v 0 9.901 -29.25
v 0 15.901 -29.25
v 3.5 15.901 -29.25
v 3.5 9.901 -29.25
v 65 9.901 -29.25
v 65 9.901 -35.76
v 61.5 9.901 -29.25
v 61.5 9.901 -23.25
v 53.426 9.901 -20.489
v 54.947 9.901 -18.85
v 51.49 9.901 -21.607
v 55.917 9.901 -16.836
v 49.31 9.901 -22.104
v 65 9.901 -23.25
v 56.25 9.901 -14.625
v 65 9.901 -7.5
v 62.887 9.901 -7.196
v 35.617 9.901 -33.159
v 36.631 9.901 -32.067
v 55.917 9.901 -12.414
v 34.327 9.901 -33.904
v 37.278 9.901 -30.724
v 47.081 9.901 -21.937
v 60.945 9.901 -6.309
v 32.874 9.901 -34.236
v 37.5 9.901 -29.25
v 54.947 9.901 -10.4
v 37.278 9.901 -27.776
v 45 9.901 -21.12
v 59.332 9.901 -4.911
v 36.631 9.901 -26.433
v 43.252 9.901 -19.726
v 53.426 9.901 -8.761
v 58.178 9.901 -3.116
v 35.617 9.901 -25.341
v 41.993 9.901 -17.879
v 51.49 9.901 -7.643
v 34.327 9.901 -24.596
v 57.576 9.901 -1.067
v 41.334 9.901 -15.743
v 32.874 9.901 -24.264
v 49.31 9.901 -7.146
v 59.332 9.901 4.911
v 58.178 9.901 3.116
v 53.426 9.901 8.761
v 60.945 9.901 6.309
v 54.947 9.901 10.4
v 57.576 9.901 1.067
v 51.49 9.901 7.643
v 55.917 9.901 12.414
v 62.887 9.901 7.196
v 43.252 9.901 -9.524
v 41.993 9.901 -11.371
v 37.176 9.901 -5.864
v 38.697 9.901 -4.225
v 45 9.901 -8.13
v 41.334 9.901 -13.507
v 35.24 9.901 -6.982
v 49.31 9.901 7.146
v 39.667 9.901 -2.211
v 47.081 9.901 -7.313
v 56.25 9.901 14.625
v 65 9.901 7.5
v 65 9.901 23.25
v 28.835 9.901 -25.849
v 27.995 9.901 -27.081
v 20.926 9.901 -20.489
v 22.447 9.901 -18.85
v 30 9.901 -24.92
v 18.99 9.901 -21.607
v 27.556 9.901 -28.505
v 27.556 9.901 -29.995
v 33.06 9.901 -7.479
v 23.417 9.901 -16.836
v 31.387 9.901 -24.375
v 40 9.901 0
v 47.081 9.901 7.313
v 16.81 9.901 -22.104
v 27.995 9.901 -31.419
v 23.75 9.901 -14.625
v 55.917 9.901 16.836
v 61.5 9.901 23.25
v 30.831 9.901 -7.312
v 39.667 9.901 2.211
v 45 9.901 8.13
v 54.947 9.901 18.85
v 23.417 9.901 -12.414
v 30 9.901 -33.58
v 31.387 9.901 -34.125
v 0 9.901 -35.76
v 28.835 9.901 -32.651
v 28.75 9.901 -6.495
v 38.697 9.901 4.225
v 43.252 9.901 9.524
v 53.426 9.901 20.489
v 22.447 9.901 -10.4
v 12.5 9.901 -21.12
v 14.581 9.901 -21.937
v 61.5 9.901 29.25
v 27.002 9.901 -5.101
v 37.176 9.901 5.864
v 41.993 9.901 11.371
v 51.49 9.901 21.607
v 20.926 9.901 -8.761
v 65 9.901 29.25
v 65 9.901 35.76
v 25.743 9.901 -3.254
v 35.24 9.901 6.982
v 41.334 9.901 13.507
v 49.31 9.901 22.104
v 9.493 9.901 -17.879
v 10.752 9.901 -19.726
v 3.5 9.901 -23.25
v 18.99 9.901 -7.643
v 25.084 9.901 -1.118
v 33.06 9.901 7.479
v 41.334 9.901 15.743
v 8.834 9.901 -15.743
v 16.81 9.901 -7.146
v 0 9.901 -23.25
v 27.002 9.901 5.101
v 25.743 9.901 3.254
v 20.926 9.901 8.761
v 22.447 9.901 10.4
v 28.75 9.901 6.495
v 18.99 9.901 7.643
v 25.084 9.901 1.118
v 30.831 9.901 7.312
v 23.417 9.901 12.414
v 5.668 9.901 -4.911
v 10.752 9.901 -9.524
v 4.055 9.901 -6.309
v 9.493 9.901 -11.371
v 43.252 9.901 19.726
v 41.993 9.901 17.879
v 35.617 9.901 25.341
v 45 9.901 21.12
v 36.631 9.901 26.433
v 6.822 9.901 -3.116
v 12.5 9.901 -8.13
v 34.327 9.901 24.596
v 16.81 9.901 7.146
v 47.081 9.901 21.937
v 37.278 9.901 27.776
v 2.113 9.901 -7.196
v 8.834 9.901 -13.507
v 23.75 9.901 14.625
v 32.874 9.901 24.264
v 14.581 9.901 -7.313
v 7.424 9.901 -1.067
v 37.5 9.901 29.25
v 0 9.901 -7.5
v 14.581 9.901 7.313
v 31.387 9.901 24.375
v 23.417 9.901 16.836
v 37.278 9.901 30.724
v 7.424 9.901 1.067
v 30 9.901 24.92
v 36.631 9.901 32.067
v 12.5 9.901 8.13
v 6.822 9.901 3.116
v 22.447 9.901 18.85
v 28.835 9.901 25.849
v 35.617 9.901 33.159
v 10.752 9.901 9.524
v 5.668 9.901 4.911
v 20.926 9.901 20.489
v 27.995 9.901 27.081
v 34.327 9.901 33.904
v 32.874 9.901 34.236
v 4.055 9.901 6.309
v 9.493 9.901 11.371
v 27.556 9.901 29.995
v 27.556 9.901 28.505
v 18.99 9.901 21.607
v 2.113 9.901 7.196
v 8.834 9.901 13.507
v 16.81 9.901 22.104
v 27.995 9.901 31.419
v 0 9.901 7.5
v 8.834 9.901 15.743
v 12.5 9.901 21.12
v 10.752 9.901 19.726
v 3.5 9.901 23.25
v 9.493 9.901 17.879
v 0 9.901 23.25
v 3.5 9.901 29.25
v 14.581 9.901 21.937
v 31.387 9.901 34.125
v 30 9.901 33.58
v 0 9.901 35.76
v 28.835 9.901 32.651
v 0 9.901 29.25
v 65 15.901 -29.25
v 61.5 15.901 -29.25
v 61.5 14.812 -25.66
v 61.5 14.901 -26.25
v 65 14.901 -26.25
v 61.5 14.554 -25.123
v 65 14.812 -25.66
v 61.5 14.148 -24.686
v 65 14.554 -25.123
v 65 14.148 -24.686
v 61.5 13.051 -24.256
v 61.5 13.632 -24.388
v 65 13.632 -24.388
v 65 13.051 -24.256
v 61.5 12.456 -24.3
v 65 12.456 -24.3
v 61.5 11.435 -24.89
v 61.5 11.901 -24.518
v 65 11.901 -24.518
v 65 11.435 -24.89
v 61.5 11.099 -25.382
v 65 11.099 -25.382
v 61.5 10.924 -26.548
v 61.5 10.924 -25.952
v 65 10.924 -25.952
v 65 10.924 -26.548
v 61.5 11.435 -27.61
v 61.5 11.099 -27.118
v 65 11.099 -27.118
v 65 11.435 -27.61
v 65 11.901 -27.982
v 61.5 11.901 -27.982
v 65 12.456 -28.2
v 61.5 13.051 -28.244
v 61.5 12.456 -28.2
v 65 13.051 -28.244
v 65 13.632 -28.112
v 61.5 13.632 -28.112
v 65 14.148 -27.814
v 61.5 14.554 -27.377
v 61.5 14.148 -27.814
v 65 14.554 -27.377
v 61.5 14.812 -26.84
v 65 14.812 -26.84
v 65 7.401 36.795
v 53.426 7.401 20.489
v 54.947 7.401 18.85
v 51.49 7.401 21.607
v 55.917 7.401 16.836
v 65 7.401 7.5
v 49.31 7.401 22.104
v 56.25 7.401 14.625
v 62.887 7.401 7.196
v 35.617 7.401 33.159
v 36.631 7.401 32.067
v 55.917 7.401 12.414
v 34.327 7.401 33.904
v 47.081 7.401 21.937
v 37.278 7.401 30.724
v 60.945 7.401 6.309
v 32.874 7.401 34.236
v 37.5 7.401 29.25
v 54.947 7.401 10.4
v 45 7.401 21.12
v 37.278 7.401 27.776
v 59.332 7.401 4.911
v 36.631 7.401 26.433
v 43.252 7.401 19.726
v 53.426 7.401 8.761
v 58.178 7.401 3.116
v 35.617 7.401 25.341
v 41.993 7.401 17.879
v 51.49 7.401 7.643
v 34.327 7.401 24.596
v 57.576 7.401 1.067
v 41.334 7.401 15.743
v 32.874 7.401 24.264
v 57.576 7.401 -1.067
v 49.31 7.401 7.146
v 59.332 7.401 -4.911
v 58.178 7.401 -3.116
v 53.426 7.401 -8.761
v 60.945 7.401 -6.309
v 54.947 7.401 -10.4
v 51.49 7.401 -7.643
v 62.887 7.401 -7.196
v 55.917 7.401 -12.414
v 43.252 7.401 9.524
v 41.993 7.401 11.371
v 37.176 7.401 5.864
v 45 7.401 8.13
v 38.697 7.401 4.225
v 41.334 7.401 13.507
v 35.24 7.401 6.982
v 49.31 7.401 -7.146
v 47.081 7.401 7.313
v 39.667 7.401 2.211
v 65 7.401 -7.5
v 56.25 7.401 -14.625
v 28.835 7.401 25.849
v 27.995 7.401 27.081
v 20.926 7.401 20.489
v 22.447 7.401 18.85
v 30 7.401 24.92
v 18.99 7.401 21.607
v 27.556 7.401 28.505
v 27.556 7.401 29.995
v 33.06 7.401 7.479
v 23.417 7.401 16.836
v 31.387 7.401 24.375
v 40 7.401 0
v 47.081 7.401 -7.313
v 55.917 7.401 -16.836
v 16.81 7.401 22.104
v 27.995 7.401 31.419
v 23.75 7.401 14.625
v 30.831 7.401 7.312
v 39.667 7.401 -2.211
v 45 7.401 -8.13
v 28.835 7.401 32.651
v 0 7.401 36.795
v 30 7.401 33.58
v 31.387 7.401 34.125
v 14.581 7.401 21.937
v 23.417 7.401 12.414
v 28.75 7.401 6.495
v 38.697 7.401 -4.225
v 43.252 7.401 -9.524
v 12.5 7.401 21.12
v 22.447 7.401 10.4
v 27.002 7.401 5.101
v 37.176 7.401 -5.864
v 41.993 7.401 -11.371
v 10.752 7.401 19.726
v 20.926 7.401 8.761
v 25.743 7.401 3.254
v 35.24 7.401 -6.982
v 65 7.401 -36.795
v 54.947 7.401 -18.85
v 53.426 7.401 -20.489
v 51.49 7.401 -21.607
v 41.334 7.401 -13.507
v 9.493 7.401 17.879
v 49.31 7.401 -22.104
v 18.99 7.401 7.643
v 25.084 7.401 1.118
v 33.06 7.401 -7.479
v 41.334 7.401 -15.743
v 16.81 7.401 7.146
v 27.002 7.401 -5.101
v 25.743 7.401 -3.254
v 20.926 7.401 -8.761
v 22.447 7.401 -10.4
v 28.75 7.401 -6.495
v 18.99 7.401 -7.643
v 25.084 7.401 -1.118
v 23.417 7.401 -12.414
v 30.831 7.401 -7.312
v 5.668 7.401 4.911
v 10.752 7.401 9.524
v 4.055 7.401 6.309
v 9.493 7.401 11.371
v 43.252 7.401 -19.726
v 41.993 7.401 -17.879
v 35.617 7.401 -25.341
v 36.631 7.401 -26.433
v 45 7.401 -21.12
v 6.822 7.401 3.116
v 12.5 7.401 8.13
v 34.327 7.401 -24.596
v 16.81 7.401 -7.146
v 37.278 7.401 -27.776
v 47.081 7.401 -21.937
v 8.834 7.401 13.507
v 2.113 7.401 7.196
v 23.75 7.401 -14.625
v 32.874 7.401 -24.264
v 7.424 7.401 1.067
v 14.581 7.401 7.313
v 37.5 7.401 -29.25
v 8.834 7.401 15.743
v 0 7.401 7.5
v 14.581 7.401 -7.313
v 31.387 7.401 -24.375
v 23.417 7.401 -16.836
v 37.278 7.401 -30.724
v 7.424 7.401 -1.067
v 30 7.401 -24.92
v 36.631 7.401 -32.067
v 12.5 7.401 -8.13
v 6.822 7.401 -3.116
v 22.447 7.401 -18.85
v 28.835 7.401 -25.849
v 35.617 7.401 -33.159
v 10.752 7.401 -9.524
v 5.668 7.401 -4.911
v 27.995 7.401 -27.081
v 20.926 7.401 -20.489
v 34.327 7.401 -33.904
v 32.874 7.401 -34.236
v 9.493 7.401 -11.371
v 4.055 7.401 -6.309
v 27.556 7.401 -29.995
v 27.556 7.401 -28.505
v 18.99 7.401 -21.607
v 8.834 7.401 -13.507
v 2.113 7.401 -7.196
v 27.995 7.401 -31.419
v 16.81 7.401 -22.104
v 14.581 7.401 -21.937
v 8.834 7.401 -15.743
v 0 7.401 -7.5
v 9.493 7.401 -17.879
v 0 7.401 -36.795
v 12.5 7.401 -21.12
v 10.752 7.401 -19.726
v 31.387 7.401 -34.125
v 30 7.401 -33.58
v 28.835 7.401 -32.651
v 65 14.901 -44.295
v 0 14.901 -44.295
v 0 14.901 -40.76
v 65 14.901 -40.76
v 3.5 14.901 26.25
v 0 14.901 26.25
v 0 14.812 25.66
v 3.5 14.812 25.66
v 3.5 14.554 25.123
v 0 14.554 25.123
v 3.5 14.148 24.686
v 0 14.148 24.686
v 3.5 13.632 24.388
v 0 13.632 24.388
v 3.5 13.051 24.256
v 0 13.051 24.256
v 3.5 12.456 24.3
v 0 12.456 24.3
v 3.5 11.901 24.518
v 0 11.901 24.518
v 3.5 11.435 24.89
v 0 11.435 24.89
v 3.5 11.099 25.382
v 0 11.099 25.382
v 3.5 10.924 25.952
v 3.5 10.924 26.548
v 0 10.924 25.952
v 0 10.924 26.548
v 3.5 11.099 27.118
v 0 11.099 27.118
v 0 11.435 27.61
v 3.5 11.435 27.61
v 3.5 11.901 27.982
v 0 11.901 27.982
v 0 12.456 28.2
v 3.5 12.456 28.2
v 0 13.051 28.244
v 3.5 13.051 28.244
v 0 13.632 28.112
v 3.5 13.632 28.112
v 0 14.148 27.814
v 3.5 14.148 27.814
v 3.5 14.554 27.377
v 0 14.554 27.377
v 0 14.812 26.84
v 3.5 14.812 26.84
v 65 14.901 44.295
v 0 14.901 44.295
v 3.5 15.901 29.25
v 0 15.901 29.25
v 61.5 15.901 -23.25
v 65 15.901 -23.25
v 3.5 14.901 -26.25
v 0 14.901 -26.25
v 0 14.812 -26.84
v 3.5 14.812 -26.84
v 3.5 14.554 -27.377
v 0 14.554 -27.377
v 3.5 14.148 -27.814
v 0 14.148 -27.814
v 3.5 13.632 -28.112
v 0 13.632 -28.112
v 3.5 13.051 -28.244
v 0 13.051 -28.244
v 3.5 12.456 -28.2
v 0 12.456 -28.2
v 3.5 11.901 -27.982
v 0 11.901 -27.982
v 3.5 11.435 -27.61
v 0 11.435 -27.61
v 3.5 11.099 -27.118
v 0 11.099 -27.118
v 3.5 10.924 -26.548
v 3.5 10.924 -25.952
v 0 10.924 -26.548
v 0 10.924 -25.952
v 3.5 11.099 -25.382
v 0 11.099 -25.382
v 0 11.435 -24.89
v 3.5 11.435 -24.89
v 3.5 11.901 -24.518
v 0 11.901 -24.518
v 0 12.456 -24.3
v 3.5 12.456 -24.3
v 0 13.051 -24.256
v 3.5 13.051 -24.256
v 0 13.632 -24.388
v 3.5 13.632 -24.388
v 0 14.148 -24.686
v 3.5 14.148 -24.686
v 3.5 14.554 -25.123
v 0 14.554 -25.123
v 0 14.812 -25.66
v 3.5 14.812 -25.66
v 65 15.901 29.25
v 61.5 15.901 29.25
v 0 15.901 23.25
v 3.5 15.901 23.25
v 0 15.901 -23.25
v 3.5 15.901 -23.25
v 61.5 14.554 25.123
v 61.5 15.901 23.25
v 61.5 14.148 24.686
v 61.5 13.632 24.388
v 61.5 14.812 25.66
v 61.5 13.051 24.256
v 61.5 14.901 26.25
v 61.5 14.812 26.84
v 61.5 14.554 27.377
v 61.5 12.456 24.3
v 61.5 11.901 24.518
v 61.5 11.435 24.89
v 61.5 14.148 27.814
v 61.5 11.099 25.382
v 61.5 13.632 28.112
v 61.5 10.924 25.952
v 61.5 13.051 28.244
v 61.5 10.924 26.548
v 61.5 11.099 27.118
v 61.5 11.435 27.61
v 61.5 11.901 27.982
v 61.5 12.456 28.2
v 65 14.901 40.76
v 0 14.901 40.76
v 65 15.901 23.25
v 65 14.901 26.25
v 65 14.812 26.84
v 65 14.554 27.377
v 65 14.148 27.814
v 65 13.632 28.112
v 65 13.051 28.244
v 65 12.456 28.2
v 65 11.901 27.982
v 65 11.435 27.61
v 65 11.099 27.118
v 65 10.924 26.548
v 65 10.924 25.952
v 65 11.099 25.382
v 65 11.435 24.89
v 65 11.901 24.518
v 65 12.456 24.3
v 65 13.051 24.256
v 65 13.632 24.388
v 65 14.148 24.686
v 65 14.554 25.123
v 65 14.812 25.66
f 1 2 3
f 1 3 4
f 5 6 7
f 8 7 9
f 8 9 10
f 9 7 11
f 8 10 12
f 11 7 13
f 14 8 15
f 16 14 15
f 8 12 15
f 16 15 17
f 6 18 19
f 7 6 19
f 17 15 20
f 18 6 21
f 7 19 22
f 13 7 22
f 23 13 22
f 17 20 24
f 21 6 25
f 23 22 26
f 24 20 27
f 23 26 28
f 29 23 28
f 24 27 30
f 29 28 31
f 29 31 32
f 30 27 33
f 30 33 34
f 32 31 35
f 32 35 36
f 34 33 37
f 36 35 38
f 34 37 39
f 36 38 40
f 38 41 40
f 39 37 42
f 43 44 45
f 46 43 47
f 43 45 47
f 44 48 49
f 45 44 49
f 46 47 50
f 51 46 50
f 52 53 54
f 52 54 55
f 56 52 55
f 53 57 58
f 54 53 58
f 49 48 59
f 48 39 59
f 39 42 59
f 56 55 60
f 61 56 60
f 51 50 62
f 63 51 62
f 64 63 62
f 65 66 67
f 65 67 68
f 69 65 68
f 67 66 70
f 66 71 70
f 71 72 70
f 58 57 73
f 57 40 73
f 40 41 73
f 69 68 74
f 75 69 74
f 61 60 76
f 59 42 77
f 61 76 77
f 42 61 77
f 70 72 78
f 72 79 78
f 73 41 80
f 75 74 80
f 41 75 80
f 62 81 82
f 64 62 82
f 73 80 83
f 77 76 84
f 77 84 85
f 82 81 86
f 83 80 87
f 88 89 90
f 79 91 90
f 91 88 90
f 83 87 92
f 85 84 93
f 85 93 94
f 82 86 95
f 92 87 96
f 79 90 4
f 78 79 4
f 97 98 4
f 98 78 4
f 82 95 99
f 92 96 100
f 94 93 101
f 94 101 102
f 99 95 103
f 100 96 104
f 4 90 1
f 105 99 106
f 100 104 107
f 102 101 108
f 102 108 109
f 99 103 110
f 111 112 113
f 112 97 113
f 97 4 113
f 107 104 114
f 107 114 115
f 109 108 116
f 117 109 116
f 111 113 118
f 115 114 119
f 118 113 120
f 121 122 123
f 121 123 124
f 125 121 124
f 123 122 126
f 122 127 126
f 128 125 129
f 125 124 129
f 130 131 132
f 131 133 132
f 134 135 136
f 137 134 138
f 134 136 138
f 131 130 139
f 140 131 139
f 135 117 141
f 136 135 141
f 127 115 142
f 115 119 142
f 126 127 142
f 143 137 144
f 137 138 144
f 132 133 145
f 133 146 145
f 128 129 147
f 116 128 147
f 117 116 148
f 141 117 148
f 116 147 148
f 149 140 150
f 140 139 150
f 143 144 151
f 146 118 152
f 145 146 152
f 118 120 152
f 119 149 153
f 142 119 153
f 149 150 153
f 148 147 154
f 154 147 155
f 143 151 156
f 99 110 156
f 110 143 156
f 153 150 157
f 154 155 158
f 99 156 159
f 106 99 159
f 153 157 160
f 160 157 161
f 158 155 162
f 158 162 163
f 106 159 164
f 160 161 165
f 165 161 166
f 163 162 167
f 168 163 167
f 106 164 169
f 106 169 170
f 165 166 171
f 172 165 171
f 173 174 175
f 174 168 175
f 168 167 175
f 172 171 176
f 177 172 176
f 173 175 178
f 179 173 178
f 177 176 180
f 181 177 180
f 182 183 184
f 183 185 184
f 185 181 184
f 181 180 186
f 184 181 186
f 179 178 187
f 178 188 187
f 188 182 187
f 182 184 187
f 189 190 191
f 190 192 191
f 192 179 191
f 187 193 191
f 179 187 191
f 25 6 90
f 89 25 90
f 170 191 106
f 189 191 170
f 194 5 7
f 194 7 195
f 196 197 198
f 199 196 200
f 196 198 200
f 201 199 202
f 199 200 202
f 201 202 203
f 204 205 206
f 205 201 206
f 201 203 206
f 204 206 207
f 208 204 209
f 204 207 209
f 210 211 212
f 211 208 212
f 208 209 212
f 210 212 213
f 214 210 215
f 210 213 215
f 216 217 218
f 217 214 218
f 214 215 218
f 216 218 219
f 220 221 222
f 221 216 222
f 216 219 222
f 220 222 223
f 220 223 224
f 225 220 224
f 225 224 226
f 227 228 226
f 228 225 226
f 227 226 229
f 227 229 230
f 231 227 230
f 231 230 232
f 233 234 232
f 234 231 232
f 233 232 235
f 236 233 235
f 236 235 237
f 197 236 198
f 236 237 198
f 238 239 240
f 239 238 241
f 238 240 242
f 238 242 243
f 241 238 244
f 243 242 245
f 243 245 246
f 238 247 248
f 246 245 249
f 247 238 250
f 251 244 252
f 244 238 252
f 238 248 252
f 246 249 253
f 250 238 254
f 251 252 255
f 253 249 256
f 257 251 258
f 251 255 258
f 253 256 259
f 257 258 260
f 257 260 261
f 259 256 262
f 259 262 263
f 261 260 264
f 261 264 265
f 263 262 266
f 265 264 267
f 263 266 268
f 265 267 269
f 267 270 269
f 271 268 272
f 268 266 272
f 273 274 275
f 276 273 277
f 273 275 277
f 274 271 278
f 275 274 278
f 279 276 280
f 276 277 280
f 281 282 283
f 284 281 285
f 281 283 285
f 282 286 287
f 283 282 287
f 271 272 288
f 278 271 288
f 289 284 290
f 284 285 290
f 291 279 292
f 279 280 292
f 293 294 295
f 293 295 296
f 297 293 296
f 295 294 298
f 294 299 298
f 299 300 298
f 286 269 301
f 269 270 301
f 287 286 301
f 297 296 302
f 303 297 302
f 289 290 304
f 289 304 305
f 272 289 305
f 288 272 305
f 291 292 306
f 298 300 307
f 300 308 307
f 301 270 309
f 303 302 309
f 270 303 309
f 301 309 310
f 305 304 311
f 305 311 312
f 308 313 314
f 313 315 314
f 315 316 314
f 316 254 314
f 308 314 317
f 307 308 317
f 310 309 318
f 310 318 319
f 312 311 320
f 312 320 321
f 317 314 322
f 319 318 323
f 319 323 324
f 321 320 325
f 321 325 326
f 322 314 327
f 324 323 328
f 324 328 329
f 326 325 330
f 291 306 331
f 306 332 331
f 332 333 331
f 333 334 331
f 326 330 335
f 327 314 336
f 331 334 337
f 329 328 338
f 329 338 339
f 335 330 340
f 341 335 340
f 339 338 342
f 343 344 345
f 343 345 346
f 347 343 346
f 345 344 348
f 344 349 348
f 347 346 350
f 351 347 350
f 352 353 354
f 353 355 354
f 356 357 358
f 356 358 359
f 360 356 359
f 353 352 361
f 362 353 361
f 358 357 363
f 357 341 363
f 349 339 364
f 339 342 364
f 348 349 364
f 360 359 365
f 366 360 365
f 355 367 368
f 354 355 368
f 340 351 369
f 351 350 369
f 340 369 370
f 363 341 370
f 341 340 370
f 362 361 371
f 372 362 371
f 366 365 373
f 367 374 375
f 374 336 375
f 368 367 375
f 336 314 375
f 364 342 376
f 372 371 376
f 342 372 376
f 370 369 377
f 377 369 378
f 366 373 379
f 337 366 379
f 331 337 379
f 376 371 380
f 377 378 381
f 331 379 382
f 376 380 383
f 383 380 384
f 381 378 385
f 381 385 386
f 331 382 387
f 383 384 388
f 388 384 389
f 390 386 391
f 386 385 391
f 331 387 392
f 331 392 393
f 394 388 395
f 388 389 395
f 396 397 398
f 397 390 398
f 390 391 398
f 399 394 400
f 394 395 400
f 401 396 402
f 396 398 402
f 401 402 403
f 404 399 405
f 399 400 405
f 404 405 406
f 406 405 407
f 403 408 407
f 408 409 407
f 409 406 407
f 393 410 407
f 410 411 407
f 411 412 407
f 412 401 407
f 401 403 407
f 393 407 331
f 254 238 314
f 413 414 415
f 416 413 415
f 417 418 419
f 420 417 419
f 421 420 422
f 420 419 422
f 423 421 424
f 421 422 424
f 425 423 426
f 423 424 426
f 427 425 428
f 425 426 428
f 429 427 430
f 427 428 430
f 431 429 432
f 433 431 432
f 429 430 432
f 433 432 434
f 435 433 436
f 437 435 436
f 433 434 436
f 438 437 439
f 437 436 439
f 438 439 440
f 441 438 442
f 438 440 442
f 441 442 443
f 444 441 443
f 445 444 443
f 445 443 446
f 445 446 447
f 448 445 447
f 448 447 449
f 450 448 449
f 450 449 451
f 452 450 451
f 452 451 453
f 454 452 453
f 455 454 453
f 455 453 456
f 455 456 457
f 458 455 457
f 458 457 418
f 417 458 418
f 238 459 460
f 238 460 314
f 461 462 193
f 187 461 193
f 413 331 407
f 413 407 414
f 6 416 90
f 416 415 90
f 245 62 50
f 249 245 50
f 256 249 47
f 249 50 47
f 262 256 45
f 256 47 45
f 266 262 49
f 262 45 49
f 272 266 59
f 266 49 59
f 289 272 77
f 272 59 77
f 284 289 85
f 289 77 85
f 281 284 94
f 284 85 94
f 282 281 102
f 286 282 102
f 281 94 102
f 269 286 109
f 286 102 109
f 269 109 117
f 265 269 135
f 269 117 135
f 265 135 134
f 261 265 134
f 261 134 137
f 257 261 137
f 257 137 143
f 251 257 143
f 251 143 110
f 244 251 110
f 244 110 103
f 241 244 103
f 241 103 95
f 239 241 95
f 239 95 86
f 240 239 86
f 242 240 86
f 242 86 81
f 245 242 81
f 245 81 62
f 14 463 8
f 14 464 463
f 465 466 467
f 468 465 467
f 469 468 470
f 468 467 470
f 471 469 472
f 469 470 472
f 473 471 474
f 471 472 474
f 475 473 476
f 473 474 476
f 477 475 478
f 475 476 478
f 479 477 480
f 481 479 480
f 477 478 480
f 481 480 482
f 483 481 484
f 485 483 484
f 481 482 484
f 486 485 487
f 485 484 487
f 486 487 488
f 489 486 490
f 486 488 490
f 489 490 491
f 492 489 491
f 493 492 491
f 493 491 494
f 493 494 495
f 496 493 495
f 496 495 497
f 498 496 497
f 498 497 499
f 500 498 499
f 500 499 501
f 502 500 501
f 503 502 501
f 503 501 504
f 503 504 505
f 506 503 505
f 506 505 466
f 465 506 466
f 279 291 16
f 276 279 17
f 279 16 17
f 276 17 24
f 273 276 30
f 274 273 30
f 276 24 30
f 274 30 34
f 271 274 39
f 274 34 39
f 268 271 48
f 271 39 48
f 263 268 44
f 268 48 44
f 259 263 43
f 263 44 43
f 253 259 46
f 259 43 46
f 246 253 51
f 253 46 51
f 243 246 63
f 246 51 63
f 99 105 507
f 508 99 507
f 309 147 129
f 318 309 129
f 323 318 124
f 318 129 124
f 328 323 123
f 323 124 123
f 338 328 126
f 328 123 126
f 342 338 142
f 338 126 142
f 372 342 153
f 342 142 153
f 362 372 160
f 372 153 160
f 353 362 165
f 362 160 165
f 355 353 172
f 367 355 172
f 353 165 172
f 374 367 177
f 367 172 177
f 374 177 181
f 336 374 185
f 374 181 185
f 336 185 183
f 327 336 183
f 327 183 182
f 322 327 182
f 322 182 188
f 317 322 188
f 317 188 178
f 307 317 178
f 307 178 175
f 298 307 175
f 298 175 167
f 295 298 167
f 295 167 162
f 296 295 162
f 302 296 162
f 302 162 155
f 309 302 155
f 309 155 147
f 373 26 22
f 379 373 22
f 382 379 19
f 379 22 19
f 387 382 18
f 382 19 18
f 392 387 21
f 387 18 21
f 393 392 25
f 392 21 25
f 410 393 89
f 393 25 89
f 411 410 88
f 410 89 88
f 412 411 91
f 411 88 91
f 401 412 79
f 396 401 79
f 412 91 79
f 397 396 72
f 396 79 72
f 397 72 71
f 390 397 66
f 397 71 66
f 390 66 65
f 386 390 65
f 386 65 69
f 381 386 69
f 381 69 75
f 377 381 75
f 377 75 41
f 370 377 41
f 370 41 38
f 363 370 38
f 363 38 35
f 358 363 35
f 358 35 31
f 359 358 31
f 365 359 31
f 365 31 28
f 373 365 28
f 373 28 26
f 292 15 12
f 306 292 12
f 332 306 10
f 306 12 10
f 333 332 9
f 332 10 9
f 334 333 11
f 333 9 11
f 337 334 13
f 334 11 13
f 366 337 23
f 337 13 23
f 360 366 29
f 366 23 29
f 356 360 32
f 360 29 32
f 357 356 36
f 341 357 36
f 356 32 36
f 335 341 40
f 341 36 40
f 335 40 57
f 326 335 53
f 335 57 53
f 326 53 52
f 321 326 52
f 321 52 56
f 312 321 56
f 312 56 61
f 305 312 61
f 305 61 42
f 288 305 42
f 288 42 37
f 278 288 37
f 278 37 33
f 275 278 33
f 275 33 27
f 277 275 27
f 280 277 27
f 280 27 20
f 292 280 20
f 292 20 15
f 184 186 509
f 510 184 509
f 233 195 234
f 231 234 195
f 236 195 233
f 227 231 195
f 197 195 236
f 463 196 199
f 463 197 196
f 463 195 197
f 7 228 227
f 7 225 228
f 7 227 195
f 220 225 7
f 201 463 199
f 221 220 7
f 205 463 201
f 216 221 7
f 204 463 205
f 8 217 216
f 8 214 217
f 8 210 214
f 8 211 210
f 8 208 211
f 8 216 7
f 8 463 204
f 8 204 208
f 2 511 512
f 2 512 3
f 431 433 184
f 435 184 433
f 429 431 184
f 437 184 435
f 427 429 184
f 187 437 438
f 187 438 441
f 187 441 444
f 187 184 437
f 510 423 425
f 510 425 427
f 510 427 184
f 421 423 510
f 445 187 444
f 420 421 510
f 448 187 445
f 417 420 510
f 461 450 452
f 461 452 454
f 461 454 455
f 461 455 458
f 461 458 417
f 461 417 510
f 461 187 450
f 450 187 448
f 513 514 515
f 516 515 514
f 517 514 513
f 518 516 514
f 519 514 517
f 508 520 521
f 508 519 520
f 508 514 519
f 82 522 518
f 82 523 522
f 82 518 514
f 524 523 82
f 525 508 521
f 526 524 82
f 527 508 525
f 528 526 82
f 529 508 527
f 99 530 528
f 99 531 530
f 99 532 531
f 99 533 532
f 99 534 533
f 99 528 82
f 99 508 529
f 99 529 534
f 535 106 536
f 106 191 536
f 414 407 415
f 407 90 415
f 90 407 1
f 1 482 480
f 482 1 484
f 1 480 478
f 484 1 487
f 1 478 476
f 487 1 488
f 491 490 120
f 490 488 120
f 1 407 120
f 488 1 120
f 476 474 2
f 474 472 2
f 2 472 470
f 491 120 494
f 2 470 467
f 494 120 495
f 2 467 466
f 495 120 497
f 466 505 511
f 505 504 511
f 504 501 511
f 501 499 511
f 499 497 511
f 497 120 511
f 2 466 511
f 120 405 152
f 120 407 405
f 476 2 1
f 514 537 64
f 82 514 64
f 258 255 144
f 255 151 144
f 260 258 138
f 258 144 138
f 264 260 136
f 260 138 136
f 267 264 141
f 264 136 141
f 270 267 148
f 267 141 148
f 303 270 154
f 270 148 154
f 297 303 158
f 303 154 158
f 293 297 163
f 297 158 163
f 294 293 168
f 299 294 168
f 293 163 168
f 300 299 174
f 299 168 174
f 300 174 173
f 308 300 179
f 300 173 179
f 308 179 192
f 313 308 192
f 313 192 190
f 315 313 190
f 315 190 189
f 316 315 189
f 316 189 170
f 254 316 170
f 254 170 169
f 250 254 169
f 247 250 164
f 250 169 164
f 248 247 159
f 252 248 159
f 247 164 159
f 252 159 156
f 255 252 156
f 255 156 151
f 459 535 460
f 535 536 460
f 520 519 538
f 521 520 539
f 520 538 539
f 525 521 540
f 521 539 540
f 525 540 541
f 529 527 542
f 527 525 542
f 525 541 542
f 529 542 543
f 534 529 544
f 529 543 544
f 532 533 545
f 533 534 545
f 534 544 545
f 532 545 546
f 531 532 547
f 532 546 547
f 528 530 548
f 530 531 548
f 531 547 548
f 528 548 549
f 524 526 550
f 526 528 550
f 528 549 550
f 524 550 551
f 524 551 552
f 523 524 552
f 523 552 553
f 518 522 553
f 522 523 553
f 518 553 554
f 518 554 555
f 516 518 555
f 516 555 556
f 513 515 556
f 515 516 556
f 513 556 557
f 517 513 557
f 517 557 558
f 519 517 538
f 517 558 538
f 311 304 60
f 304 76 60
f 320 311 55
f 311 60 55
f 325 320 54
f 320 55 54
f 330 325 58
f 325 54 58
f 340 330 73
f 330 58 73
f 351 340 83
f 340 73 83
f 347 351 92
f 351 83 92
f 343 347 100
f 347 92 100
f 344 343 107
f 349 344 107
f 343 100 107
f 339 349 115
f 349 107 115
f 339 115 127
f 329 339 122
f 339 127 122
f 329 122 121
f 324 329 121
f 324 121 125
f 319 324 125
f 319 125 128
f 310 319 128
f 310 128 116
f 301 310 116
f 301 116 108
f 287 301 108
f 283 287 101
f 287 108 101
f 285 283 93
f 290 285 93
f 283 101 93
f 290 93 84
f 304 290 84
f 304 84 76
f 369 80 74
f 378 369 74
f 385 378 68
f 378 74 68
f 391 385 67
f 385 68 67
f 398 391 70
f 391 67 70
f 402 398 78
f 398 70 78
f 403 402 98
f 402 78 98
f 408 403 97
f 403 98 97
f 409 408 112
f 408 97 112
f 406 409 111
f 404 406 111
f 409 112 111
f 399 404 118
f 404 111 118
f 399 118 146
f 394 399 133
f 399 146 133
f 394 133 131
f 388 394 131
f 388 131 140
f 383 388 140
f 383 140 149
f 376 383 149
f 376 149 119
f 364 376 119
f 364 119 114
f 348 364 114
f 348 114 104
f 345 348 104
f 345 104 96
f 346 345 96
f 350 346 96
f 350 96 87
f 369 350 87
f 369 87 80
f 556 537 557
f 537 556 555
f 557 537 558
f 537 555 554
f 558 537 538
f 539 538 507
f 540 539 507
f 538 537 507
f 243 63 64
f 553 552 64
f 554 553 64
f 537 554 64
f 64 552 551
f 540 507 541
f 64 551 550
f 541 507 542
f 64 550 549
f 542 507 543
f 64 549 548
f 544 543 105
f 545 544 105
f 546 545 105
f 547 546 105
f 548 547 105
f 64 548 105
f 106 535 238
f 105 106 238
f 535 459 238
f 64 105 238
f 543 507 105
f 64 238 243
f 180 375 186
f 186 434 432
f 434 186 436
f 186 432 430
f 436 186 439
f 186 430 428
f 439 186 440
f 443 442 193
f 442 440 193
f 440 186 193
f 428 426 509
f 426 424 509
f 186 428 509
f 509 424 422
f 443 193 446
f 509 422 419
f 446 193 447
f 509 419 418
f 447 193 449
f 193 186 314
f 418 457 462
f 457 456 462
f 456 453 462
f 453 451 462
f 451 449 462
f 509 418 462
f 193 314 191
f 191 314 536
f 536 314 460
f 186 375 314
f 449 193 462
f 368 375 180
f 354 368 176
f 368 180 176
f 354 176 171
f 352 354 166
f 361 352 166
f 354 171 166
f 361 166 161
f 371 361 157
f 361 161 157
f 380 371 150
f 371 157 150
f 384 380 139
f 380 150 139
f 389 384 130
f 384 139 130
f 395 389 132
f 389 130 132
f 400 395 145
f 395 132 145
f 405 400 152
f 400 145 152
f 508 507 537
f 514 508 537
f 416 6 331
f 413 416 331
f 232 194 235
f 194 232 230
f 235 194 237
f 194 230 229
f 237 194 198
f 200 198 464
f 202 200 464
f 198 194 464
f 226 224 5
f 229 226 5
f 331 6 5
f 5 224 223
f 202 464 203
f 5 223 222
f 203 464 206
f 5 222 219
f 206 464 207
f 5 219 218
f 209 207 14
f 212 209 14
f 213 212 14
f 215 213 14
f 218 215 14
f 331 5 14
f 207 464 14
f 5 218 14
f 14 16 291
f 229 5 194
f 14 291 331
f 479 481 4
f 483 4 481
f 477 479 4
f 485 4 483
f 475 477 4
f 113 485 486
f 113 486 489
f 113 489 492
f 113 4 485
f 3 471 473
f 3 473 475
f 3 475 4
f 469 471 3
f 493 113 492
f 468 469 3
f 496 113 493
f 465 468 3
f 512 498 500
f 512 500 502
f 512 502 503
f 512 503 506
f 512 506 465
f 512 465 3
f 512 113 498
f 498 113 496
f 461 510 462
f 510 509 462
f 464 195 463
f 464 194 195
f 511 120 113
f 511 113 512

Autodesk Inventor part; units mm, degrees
ref_plane "YZ Plane" through (0, 0, 0) normal (1, 0, 0) x (0, 1, 0)
ref_plane "XZ Plane" through (0, 0, 0) normal (0, 1, 0) x (-1, 0, 0)
ref_plane "XY Plane" through (0, 0, 0) normal (0, 0, 1) x (1, 0, 0)
sketch "Sketch1" plane through (0, 0, 0) normal (1, 0, 0) x (0, 1, 0)
  line L0 (21.7077, 51.1019) -> (7.4012, 36.7954)
  line L1 (7.4012, 36.7954) -> (7.4012, 0)
  line L2 (21.7077, 51.1019) -> (21.7077, 0)
  line L3 (7.4012, -36.7954) -> (7.4012, 0)
  line L4 (21.7077, -51.1019) -> (21.7077, 0)
  line L5 (21.7077, -51.1019) -> (7.4012, -36.7954)
  line L6 (21.7077, -51.1019) -> (21.7077, 51.1019)
  line L7 (17.1717, -14.2524) -> (13.4217, -14.2524)
  line L8 (13.4217, -14.2524) -> (11.5467, -17.5)
  line L9 (19.0467, -17.5) -> (17.1717, -14.2524)
  circle A0 centre (15.2967, -17.5) radius 3.75
  line L10 (17.1717, -20.7476) -> (19.0467, -17.5)
  line L11 (11.5467, -17.5) -> (13.4217, -20.7476)
  line L12 (13.4217, -20.7476) -> (17.1717, -20.7476)
  line L13 (17.1717, -31.7524) -> (13.4217, -31.7524)
  line L14 (19.0467, -35) -> (17.1717, -31.7524)
  line L15 (13.4217, -31.7524) -> (11.5467, -35)
  line L16 (13.4217, -38.2476) -> (17.1717, -38.2476)
  line L17 (17.1717, -38.2476) -> (19.0467, -35)
  line L18 (11.5467, -35) -> (13.4217, -38.2476)
  circle A1 centre (15.2967, -35) radius 3.75
  circle A2 centre (15.2967, 0) radius 3.75
  line L19 (13.4217, -3.2476) -> (17.1717, -3.2476)
  line L20 (17.1717, -3.2476) -> (19.0467, 0)
  line L21 (11.5467, 0) -> (13.4217, -3.2476)
  line L22 (13.4217, 3.2476) -> (11.5467, 0)
  line L23 (17.1717, 3.2476) -> (13.4217, 3.2476)
  line L24 (19.0467, 0) -> (17.1717, 3.2476)
  line L25 (13.4217, 14.2524) -> (17.1717, 14.2524)
  line L26 (11.5467, 17.5) -> (13.4217, 14.2524)
  line L27 (17.1717, 14.2524) -> (19.0467, 17.5)
  circle A3 centre (15.2967, 17.5) radius 3.75
  line L28 (19.0467, 17.5) -> (17.1717, 20.7476)
  line L29 (17.1717, 20.7476) -> (13.4217, 20.7476)
  line L30 (13.4217, 20.7476) -> (11.5467, 17.5)
  circle A4 centre (15.2967, 35) radius 3.75
  line L31 (13.4217, 31.7524) -> (17.1717, 31.7524)
  line L32 (11.5467, 35) -> (13.4217, 31.7524)
  line L33 (17.1717, 31.7524) -> (19.0467, 35)
  line L34 (19.0467, 35) -> (17.1717, 38.2476)
  line L35 (13.4217, 38.2476) -> (11.5467, 35)
  line L36 (17.1717, 38.2476) -> (13.4217, 38.2476)
  line L37 (21.7077, 47.5664) -> (7.4012, 33.2599)
  line L38 (9.9012, 39.2954) -> (9.9012, -39.2954)
  line L39 (7.4012, -33.2599) -> (21.7077, -47.5664)
  line L40 (15.2967, 35) -> (9.9012, 35)
  line L41 (9.9012, 26.25) -> (16.1703, 26.25)
  circle A5 centre (12.9012, 26.25) radius 2
  line L42 (9.9012, 23.25) -> (15.9012, 23.25)
  line L43 (15.9012, 23.25) -> (15.9012, 29.25)
  line L44 (15.9012, 29.25) -> (9.9012, 29.25)
  line L45 (9.9012, 29.25) -> (9.9012, 23.25)
  line L46 (9.9012, 23.25) -> (15.9012, 29.25) construction
  line L47 (15.9012, 23.25) -> (9.9012, 29.25) construction
  line L48 (9.9012, -26.25) -> (17.1717, -26.25)
  circle A6 centre (12.9012, -26.25) radius 2
  line L49 (15.9012, -29.25) -> (9.9012, -29.25)
  line L50 (9.9012, -29.25) -> (9.9012, -23.25)
  line L51 (9.9012, -23.25) -> (15.9012, -23.25)
  line L52 (15.9012, -23.25) -> (15.9012, -29.25)
  line L53 (15.9012, -29.25) -> (9.9012, -23.25) construction
  line L54 (9.9012, -29.25) -> (15.9012, -23.25) construction
  line L55 (15.9012, 53.3729) -> (15.9012, -51.1019)
  line L56 (9.9012, 26.25) -> (7.4012, 26.25)
  line L57 (14.9012, -60.8562) -> (14.9012, 66.1701)
  point P0 (9.9012, 35.7599)
  point P1 (9.9012, -35.7599)
  point P2 (14.9012, 40.7599)
  point P3 (14.9012, 44.2954)
  point P4 (14.9012, -44.2954)
  point P5 (14.9012, -40.7599)
  dimension "d33" = 2.5
  dimension "d34" = 2.5
  dimension "d35" = 2.5
  dimension "d36" = 8.75
  dimension "d37" = 4
  dimension "d38" = 3
  dimension "d39" = 6
  dimension "d40" = 8.75
  dimension "d41" = 4
  dimension "d42" = 3
  dimension "d43" = 6
  dimension "d48" = 8.5
  dimension "d49" = 7.5
extrude "Extrusion1" add sketch "Sketch1" along normal blind 3.5 contours L38 L37 L1 L0 | L0 L57 L37 L38 | L38 L56 L1 L37 | L56 L38 L39 L3 L1 | L44 L57 A5 L41 L38 | L41 A5 L57 L42 L38 | L44 L43 L41 L57 | L39 L38 L5 L3 | L41 L43 L42 L57 | L39 L57 L5 L38 | L51 L57 A6 L48 L38 | L38 L48 A6 L57 L49 | L51 L52 L48 L57 | L57 L48 L52 L49
sketch "Sketch2" plane through (3.5, 0, 0) normal (1, 0, 0) x (0, 0, -1)
  line L0 (-44.2954, 14.9012) -> (-36.7954, 7.4012) projected
  line L1 (-36.7954, 7.4012) -> (36.7954, 7.4012) projected
  line L2 (36.7954, 7.4012) -> (44.2954, 14.9012) projected
  line L3 (40.7599, 14.9012) -> (35.7599, 9.9012) projected
  line L4 (35.7599, 9.9012) -> (29.25, 9.9012) projected
  line L5 (29.25, 9.9012) -> (29.25, 15.9012) projected
  line L6 (29.25, 15.9012) -> (23.25, 15.9012) projected
  line L7 (23.25, 15.9012) -> (23.25, 9.9012) projected
  line L8 (23.25, 9.9012) -> (-23.25, 9.9012) projected
  line L9 (-23.25, 9.9012) -> (-23.25, 15.9012) projected
  line L10 (-23.25, 15.9012) -> (-29.25, 15.9012) projected
  line L11 (-29.25, 15.9012) -> (-29.25, 9.9012) projected
  line L12 (-29.25, 9.9012) -> (-35.7599, 9.9012) projected
  line L13 (-35.7599, 9.9012) -> (-40.7599, 14.9012) projected
  circle A0 centre (-26.25, 12.9012) radius 2 projected
  circle A1 centre (26.25, 12.9012) radius 2 projected
  line L14 (-29.25, 9.9012) -> (-23.25, 9.9012)
  line L15 (35.7599, 9.9012) -> (29.25, 9.9012) projected
  line L16 (23.25, 15.9012) -> (23.25, 9.9012) projected
  line L17 (29.25, 9.9012) -> (23.25, 9.9012)
  line L18 (-40.7599, 14.9012) -> (-44.2954, 14.9012) projected
  line L19 (44.2954, 14.9012) -> (40.7599, 14.9012) projected
  point P0 (0, 0)
extrude "Extrusion2" add sketch "Sketch2" along normal blind 29 contours L18 L13 L12 L14 L8 L17 L4 L3 L19 L2 L1 L0
mirror "Mirror1" about plane through (32.5, 11.1512, 0) normal (1, 0, 0)
sketch "Sketch4" plane through (0, 9.9012, 23.25) normal (0, 1, 0) x (1, 0, 0)
  line L0 (0, 59.0099) -> (0, 52.5) projected
  line L1 (0, 52.5) -> (3.5, 52.5) projected
  line L2 (3.5, 46.5) -> (3.5, 52.5) projected
  line L3 (0, 46.5) -> (3.5, 46.5) projected
  line L4 (0, 46.5) -> (0, 0) projected
  line L5 (0, 0) -> (3.5, 0) projected
  line L6 (3.5, -6) -> (3.5, 0) projected
  line L7 (0, -6) -> (3.5, -6) projected
  line L8 (0, -6) -> (0, -12.5099) projected
  line L9 (0, -12.5099) -> (65, -12.5099) projected
  line L10 (65, -6) -> (65, -12.5099) projected
  line L11 (65, -6) -> (61.5, -6) projected
  line L12 (61.5, -6) -> (61.5, 0) projected
  line L13 (65, 0) -> (61.5, 0) projected
  line L14 (65, 46.5) -> (65, 0) projected
  line L15 (65, 46.5) -> (61.5, 46.5) projected
  line L16 (61.5, 46.5) -> (61.5, 52.5) projected
  line L17 (65, 52.5) -> (61.5, 52.5) projected
  line L18 (65, 59.0099) -> (65, 52.5) projected
  line L19 (0, 59.0099) -> (65, 59.0099) projected
  line L20 (0, 52.5) -> (65, 52.5)
  line L21 (65, -13.5454) -> (65, 60.0454) projected
  line L22 (0, -6) -> (65, -6)
  line L23 (0, 52.5) -> (65, -6)
  line L24 (0, -6) -> (3.5, -6) projected
  line L25 (0, -6) -> (65, 52.5)
  line L26 (32.5, 52.5) -> (32.5, -6)
  line L27 (65, 46.5) -> (65, 0) projected
  line L28 (65, 23.25) -> (0, 23.25)
  line L29 (65, 23.25) -> (32.5, 52.5)
  line L30 (0, 23.25) -> (32.5, 52.5)
  line L31 (0, 23.25) -> (32.5, -6)
  line L32 (32.5, -6) -> (65, 23.25)
  circle A0 centre (16.25, 37.875) radius 7.5
  circle A1 centre (32.5, 23.25) radius 7.5
  circle A2 centre (48.75, 37.875) radius 7.5
  circle A3 centre (16.25, 8.625) radius 7.5
  circle A4 centre (48.75, 8.625) radius 7.5
  line L33 (16.25, 59.0099) -> (16.25, -12.5099)
  line L34 (0, -12.5099) -> (65, -12.5099) projected
  line L35 (48.75, -12.5099) -> (48.75, 59.0099)
  line L36 (0, 59.0099) -> (65, 59.0099) projected
  line L37 (32.5, 59.0099) -> (32.5, -12.5099)
  circle A5 centre (32.5, 52.5) radius 5
  circle A6 centre (32.5, -6) radius 5
  arc A7 (0, 15.75) -> (0, 30.75) centre (0, 23.25) ccw
  arc A8 (65, 30.75) -> (65, 15.75) centre (65, 23.25) ccw
  dimension "d62" = 15
  dimension "d63" = 15
  dimension "d64" = 15
  dimension "d65" = 15
  dimension "d66" = 15
  dimension "d69" = 10
  dimension "d70" = 10
  dimension "d71" = 15
  dimension "d72" = 15
extrude "Extrusion3" cut sketch "Sketch4" against normal blind 10 contours A0 L33 L23 | L23 L30 A0 | A5 L20 L37 | L37 L20 A5 | L20 L30 A5 | A0 L30 L33 | L30 A0 L23 | L33 A0 L30 | L23 A0 L33 | L29 A5 L26 | L20 A5 L29 | L26 A5 L30 | A7 L30 L4 | A7 L28 L30 | L35 L29 A2 | A2 L25 L35 | L31 A7 L4 | L28 A7 L31 | A1 L26 L23 | L23 L28 A1 | A2 L29 L25 | L29 L25 A2 | L35 A2 L25 | L29 A2 L35 | A1 L25 L26 | L28 A1 L23 | L26 A1 L25 | L23 A1 L26 | L25 A1 L28 | L25 A1 L28 | L33 L31 A3 | A3 L25 L33 | L14 L29 A8 | L31 L25 A3 | A3 L31 L25 | L33 A3 L25 | L31 A3 L33 | L32 A8 L28 | L28 A8 L29 | L14 A8 L32 | A4 L35 L23 | L23 L32 A4 | A6 L32 L26 | L26 L31 A6 | A4 L32 L35 | L32 A4 L23 | L35 A4 L32 | L23 A4 L35 | L32 A6 L22 | L37 A6 L22 | L22 A6 L31 | L22 A6 L37
properties part number "Bed"
